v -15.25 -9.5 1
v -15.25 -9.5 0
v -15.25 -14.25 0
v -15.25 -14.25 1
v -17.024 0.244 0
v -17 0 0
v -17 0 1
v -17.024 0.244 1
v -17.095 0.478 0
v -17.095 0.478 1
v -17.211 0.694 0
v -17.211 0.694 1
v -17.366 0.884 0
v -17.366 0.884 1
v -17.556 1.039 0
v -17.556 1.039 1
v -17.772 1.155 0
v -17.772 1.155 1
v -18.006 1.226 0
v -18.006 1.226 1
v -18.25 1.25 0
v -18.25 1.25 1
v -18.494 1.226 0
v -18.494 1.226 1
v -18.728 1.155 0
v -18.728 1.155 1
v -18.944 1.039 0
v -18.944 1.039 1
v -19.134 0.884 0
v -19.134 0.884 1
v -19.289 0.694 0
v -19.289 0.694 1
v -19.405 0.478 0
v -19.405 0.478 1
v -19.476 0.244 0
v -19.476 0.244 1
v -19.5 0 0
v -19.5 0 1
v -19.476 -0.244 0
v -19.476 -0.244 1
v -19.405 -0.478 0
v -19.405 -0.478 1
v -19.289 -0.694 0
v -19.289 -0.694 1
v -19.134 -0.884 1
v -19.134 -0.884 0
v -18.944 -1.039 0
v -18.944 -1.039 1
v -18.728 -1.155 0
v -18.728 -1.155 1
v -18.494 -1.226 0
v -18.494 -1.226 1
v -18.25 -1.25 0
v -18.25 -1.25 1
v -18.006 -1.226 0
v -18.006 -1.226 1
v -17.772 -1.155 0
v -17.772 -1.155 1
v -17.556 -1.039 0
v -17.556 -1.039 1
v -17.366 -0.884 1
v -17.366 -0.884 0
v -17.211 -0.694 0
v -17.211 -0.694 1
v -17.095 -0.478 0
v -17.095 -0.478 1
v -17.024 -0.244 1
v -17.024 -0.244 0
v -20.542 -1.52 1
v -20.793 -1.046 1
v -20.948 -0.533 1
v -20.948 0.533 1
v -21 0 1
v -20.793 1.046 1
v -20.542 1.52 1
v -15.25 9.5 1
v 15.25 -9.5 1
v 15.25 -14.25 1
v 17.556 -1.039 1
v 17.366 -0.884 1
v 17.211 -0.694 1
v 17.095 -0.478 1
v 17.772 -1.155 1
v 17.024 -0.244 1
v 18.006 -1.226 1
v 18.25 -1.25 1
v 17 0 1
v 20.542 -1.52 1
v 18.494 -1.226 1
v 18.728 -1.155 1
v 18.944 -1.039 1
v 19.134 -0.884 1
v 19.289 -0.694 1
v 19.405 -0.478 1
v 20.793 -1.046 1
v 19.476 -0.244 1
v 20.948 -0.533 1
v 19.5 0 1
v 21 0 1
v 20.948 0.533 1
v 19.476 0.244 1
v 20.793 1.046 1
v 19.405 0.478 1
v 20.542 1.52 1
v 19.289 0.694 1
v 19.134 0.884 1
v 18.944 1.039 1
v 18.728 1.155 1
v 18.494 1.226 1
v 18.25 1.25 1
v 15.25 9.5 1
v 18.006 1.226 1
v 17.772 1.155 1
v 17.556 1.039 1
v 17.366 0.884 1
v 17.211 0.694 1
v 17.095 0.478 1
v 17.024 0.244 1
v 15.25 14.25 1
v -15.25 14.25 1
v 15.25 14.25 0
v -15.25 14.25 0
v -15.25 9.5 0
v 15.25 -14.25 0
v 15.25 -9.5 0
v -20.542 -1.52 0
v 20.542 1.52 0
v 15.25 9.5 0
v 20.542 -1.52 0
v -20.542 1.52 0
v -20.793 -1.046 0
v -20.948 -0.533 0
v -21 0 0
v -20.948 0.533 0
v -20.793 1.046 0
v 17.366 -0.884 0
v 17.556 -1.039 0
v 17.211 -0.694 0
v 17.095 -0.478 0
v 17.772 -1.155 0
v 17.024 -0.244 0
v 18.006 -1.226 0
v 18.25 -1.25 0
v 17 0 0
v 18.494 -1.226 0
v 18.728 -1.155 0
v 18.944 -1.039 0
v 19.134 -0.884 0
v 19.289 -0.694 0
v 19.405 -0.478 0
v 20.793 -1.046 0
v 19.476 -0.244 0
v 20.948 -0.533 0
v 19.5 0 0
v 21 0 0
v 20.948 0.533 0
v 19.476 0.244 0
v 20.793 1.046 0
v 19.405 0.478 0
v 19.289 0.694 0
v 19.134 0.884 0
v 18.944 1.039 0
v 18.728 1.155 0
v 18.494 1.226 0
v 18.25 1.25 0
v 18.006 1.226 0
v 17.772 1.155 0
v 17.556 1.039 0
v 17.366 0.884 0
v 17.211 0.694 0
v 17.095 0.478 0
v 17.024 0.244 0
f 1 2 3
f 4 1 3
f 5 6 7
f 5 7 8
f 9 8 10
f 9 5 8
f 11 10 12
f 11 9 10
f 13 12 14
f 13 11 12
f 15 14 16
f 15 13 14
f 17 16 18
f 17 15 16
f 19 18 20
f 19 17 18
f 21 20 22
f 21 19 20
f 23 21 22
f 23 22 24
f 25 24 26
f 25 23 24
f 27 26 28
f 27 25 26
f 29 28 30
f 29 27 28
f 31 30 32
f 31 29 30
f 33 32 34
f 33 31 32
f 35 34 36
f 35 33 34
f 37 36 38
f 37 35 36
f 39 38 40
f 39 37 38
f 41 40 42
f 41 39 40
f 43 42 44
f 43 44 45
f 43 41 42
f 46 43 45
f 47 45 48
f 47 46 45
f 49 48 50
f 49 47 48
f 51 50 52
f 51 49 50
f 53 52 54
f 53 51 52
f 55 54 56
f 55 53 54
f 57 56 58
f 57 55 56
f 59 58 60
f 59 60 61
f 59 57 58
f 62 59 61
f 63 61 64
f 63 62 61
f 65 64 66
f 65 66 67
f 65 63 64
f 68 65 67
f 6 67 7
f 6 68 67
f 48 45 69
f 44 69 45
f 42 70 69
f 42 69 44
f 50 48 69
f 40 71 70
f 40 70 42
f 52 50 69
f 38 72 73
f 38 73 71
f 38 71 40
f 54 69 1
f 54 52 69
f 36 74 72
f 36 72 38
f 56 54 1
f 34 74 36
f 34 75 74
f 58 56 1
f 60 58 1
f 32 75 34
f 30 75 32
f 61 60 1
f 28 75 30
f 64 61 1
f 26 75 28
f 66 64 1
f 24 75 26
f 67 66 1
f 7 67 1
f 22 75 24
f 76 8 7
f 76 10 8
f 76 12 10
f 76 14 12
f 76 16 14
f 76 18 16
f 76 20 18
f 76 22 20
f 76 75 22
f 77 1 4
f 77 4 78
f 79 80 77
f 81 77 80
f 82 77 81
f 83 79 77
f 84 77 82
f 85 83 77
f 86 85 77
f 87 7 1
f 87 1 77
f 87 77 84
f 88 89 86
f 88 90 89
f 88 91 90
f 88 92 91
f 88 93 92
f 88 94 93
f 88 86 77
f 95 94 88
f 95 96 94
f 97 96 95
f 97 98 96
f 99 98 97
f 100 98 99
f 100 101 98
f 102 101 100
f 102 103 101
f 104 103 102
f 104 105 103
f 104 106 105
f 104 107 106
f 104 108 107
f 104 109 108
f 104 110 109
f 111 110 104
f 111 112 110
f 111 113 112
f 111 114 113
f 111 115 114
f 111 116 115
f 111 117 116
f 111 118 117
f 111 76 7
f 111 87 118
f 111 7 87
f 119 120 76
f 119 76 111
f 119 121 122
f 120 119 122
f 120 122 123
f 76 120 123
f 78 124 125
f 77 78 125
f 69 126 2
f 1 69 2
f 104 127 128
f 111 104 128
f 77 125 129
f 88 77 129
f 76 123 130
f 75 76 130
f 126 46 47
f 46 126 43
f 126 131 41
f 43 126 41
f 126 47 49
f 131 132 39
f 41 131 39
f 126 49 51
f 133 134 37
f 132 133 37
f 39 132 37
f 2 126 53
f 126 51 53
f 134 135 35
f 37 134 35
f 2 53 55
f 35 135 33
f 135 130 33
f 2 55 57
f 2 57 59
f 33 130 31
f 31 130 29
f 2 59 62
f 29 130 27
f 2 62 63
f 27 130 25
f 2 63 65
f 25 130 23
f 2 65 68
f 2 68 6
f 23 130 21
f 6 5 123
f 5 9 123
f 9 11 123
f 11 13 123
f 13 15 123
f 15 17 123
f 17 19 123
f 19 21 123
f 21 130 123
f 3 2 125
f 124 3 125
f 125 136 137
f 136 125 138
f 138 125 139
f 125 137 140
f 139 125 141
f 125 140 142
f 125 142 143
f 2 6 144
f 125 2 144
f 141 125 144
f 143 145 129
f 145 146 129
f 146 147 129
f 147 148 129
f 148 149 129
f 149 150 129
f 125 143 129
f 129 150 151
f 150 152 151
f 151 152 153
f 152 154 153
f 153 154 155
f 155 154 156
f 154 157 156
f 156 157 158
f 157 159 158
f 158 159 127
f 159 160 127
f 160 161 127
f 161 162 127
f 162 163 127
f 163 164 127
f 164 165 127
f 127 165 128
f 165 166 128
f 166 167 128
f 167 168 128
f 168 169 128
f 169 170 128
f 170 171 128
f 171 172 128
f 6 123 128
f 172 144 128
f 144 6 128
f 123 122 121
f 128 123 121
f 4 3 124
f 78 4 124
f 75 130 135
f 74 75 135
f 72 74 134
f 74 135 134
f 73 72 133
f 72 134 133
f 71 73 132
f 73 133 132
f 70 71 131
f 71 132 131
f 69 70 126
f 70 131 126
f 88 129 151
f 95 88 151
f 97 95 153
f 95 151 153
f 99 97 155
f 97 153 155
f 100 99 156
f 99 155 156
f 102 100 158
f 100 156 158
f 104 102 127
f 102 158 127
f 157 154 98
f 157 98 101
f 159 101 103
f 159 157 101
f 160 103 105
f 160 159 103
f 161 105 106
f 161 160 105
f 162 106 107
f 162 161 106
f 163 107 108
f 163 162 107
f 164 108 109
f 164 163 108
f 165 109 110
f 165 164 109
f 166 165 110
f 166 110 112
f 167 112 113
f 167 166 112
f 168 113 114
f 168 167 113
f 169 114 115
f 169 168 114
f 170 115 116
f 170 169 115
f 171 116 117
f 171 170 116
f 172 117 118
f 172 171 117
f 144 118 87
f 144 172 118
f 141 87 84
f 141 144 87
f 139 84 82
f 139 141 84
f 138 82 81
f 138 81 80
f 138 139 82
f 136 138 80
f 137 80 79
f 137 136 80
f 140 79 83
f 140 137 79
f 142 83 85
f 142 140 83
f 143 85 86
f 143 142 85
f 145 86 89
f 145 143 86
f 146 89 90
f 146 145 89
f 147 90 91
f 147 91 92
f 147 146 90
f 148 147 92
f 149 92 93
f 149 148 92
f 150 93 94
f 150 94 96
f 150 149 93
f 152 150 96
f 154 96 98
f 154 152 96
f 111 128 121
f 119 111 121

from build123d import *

# Parameters (mm, degrees)
F0_R     = 1.25
F1_DEPTH = 1


with BuildPart() as f1:
    # F0 (on Top) → F1 (new body)
    with BuildSketch(Plane.XY):
        Polygon((15.25, 9.5), (15.25, 14.25), (-15.25, 14.25), (-15.25, 9.5), (-15.25, -9.5), (-15.25, -14.25), (15.25, -14.25), (15.25, -9.5), align=None)
        with BuildLine():
            Line((-15.25, -9.5), (-15.25, 9.5))
            Line((-15.25, 9.5), (-20.541877, 1.519803))
            ThreePointArc((-20.541877, 1.519803), (-21, 0), (-20.541877, -1.519803))
            Line((-20.541877, -1.519803), (-15.25, -9.5))
        make_face()
        with Locations((-18.25, 0)):
            Circle(F0_R, mode=Mode.SUBTRACT)
        with BuildLine():
            Line((20.541877, 1.519803), (15.25, 9.5))
            Line((15.25, 9.5), (15.25, -9.5))
            Line((15.25, -9.5), (20.541877, -1.519803))
            ThreePointArc((20.541877, -1.519803), (21, 0), (20.541877, 1.519803))
        make_face()
        with Locations((18.25, 0)):
            Circle(F0_R, mode=Mode.SUBTRACT)
    extrude(amount=F1_DEPTH)


solid = f1.part
